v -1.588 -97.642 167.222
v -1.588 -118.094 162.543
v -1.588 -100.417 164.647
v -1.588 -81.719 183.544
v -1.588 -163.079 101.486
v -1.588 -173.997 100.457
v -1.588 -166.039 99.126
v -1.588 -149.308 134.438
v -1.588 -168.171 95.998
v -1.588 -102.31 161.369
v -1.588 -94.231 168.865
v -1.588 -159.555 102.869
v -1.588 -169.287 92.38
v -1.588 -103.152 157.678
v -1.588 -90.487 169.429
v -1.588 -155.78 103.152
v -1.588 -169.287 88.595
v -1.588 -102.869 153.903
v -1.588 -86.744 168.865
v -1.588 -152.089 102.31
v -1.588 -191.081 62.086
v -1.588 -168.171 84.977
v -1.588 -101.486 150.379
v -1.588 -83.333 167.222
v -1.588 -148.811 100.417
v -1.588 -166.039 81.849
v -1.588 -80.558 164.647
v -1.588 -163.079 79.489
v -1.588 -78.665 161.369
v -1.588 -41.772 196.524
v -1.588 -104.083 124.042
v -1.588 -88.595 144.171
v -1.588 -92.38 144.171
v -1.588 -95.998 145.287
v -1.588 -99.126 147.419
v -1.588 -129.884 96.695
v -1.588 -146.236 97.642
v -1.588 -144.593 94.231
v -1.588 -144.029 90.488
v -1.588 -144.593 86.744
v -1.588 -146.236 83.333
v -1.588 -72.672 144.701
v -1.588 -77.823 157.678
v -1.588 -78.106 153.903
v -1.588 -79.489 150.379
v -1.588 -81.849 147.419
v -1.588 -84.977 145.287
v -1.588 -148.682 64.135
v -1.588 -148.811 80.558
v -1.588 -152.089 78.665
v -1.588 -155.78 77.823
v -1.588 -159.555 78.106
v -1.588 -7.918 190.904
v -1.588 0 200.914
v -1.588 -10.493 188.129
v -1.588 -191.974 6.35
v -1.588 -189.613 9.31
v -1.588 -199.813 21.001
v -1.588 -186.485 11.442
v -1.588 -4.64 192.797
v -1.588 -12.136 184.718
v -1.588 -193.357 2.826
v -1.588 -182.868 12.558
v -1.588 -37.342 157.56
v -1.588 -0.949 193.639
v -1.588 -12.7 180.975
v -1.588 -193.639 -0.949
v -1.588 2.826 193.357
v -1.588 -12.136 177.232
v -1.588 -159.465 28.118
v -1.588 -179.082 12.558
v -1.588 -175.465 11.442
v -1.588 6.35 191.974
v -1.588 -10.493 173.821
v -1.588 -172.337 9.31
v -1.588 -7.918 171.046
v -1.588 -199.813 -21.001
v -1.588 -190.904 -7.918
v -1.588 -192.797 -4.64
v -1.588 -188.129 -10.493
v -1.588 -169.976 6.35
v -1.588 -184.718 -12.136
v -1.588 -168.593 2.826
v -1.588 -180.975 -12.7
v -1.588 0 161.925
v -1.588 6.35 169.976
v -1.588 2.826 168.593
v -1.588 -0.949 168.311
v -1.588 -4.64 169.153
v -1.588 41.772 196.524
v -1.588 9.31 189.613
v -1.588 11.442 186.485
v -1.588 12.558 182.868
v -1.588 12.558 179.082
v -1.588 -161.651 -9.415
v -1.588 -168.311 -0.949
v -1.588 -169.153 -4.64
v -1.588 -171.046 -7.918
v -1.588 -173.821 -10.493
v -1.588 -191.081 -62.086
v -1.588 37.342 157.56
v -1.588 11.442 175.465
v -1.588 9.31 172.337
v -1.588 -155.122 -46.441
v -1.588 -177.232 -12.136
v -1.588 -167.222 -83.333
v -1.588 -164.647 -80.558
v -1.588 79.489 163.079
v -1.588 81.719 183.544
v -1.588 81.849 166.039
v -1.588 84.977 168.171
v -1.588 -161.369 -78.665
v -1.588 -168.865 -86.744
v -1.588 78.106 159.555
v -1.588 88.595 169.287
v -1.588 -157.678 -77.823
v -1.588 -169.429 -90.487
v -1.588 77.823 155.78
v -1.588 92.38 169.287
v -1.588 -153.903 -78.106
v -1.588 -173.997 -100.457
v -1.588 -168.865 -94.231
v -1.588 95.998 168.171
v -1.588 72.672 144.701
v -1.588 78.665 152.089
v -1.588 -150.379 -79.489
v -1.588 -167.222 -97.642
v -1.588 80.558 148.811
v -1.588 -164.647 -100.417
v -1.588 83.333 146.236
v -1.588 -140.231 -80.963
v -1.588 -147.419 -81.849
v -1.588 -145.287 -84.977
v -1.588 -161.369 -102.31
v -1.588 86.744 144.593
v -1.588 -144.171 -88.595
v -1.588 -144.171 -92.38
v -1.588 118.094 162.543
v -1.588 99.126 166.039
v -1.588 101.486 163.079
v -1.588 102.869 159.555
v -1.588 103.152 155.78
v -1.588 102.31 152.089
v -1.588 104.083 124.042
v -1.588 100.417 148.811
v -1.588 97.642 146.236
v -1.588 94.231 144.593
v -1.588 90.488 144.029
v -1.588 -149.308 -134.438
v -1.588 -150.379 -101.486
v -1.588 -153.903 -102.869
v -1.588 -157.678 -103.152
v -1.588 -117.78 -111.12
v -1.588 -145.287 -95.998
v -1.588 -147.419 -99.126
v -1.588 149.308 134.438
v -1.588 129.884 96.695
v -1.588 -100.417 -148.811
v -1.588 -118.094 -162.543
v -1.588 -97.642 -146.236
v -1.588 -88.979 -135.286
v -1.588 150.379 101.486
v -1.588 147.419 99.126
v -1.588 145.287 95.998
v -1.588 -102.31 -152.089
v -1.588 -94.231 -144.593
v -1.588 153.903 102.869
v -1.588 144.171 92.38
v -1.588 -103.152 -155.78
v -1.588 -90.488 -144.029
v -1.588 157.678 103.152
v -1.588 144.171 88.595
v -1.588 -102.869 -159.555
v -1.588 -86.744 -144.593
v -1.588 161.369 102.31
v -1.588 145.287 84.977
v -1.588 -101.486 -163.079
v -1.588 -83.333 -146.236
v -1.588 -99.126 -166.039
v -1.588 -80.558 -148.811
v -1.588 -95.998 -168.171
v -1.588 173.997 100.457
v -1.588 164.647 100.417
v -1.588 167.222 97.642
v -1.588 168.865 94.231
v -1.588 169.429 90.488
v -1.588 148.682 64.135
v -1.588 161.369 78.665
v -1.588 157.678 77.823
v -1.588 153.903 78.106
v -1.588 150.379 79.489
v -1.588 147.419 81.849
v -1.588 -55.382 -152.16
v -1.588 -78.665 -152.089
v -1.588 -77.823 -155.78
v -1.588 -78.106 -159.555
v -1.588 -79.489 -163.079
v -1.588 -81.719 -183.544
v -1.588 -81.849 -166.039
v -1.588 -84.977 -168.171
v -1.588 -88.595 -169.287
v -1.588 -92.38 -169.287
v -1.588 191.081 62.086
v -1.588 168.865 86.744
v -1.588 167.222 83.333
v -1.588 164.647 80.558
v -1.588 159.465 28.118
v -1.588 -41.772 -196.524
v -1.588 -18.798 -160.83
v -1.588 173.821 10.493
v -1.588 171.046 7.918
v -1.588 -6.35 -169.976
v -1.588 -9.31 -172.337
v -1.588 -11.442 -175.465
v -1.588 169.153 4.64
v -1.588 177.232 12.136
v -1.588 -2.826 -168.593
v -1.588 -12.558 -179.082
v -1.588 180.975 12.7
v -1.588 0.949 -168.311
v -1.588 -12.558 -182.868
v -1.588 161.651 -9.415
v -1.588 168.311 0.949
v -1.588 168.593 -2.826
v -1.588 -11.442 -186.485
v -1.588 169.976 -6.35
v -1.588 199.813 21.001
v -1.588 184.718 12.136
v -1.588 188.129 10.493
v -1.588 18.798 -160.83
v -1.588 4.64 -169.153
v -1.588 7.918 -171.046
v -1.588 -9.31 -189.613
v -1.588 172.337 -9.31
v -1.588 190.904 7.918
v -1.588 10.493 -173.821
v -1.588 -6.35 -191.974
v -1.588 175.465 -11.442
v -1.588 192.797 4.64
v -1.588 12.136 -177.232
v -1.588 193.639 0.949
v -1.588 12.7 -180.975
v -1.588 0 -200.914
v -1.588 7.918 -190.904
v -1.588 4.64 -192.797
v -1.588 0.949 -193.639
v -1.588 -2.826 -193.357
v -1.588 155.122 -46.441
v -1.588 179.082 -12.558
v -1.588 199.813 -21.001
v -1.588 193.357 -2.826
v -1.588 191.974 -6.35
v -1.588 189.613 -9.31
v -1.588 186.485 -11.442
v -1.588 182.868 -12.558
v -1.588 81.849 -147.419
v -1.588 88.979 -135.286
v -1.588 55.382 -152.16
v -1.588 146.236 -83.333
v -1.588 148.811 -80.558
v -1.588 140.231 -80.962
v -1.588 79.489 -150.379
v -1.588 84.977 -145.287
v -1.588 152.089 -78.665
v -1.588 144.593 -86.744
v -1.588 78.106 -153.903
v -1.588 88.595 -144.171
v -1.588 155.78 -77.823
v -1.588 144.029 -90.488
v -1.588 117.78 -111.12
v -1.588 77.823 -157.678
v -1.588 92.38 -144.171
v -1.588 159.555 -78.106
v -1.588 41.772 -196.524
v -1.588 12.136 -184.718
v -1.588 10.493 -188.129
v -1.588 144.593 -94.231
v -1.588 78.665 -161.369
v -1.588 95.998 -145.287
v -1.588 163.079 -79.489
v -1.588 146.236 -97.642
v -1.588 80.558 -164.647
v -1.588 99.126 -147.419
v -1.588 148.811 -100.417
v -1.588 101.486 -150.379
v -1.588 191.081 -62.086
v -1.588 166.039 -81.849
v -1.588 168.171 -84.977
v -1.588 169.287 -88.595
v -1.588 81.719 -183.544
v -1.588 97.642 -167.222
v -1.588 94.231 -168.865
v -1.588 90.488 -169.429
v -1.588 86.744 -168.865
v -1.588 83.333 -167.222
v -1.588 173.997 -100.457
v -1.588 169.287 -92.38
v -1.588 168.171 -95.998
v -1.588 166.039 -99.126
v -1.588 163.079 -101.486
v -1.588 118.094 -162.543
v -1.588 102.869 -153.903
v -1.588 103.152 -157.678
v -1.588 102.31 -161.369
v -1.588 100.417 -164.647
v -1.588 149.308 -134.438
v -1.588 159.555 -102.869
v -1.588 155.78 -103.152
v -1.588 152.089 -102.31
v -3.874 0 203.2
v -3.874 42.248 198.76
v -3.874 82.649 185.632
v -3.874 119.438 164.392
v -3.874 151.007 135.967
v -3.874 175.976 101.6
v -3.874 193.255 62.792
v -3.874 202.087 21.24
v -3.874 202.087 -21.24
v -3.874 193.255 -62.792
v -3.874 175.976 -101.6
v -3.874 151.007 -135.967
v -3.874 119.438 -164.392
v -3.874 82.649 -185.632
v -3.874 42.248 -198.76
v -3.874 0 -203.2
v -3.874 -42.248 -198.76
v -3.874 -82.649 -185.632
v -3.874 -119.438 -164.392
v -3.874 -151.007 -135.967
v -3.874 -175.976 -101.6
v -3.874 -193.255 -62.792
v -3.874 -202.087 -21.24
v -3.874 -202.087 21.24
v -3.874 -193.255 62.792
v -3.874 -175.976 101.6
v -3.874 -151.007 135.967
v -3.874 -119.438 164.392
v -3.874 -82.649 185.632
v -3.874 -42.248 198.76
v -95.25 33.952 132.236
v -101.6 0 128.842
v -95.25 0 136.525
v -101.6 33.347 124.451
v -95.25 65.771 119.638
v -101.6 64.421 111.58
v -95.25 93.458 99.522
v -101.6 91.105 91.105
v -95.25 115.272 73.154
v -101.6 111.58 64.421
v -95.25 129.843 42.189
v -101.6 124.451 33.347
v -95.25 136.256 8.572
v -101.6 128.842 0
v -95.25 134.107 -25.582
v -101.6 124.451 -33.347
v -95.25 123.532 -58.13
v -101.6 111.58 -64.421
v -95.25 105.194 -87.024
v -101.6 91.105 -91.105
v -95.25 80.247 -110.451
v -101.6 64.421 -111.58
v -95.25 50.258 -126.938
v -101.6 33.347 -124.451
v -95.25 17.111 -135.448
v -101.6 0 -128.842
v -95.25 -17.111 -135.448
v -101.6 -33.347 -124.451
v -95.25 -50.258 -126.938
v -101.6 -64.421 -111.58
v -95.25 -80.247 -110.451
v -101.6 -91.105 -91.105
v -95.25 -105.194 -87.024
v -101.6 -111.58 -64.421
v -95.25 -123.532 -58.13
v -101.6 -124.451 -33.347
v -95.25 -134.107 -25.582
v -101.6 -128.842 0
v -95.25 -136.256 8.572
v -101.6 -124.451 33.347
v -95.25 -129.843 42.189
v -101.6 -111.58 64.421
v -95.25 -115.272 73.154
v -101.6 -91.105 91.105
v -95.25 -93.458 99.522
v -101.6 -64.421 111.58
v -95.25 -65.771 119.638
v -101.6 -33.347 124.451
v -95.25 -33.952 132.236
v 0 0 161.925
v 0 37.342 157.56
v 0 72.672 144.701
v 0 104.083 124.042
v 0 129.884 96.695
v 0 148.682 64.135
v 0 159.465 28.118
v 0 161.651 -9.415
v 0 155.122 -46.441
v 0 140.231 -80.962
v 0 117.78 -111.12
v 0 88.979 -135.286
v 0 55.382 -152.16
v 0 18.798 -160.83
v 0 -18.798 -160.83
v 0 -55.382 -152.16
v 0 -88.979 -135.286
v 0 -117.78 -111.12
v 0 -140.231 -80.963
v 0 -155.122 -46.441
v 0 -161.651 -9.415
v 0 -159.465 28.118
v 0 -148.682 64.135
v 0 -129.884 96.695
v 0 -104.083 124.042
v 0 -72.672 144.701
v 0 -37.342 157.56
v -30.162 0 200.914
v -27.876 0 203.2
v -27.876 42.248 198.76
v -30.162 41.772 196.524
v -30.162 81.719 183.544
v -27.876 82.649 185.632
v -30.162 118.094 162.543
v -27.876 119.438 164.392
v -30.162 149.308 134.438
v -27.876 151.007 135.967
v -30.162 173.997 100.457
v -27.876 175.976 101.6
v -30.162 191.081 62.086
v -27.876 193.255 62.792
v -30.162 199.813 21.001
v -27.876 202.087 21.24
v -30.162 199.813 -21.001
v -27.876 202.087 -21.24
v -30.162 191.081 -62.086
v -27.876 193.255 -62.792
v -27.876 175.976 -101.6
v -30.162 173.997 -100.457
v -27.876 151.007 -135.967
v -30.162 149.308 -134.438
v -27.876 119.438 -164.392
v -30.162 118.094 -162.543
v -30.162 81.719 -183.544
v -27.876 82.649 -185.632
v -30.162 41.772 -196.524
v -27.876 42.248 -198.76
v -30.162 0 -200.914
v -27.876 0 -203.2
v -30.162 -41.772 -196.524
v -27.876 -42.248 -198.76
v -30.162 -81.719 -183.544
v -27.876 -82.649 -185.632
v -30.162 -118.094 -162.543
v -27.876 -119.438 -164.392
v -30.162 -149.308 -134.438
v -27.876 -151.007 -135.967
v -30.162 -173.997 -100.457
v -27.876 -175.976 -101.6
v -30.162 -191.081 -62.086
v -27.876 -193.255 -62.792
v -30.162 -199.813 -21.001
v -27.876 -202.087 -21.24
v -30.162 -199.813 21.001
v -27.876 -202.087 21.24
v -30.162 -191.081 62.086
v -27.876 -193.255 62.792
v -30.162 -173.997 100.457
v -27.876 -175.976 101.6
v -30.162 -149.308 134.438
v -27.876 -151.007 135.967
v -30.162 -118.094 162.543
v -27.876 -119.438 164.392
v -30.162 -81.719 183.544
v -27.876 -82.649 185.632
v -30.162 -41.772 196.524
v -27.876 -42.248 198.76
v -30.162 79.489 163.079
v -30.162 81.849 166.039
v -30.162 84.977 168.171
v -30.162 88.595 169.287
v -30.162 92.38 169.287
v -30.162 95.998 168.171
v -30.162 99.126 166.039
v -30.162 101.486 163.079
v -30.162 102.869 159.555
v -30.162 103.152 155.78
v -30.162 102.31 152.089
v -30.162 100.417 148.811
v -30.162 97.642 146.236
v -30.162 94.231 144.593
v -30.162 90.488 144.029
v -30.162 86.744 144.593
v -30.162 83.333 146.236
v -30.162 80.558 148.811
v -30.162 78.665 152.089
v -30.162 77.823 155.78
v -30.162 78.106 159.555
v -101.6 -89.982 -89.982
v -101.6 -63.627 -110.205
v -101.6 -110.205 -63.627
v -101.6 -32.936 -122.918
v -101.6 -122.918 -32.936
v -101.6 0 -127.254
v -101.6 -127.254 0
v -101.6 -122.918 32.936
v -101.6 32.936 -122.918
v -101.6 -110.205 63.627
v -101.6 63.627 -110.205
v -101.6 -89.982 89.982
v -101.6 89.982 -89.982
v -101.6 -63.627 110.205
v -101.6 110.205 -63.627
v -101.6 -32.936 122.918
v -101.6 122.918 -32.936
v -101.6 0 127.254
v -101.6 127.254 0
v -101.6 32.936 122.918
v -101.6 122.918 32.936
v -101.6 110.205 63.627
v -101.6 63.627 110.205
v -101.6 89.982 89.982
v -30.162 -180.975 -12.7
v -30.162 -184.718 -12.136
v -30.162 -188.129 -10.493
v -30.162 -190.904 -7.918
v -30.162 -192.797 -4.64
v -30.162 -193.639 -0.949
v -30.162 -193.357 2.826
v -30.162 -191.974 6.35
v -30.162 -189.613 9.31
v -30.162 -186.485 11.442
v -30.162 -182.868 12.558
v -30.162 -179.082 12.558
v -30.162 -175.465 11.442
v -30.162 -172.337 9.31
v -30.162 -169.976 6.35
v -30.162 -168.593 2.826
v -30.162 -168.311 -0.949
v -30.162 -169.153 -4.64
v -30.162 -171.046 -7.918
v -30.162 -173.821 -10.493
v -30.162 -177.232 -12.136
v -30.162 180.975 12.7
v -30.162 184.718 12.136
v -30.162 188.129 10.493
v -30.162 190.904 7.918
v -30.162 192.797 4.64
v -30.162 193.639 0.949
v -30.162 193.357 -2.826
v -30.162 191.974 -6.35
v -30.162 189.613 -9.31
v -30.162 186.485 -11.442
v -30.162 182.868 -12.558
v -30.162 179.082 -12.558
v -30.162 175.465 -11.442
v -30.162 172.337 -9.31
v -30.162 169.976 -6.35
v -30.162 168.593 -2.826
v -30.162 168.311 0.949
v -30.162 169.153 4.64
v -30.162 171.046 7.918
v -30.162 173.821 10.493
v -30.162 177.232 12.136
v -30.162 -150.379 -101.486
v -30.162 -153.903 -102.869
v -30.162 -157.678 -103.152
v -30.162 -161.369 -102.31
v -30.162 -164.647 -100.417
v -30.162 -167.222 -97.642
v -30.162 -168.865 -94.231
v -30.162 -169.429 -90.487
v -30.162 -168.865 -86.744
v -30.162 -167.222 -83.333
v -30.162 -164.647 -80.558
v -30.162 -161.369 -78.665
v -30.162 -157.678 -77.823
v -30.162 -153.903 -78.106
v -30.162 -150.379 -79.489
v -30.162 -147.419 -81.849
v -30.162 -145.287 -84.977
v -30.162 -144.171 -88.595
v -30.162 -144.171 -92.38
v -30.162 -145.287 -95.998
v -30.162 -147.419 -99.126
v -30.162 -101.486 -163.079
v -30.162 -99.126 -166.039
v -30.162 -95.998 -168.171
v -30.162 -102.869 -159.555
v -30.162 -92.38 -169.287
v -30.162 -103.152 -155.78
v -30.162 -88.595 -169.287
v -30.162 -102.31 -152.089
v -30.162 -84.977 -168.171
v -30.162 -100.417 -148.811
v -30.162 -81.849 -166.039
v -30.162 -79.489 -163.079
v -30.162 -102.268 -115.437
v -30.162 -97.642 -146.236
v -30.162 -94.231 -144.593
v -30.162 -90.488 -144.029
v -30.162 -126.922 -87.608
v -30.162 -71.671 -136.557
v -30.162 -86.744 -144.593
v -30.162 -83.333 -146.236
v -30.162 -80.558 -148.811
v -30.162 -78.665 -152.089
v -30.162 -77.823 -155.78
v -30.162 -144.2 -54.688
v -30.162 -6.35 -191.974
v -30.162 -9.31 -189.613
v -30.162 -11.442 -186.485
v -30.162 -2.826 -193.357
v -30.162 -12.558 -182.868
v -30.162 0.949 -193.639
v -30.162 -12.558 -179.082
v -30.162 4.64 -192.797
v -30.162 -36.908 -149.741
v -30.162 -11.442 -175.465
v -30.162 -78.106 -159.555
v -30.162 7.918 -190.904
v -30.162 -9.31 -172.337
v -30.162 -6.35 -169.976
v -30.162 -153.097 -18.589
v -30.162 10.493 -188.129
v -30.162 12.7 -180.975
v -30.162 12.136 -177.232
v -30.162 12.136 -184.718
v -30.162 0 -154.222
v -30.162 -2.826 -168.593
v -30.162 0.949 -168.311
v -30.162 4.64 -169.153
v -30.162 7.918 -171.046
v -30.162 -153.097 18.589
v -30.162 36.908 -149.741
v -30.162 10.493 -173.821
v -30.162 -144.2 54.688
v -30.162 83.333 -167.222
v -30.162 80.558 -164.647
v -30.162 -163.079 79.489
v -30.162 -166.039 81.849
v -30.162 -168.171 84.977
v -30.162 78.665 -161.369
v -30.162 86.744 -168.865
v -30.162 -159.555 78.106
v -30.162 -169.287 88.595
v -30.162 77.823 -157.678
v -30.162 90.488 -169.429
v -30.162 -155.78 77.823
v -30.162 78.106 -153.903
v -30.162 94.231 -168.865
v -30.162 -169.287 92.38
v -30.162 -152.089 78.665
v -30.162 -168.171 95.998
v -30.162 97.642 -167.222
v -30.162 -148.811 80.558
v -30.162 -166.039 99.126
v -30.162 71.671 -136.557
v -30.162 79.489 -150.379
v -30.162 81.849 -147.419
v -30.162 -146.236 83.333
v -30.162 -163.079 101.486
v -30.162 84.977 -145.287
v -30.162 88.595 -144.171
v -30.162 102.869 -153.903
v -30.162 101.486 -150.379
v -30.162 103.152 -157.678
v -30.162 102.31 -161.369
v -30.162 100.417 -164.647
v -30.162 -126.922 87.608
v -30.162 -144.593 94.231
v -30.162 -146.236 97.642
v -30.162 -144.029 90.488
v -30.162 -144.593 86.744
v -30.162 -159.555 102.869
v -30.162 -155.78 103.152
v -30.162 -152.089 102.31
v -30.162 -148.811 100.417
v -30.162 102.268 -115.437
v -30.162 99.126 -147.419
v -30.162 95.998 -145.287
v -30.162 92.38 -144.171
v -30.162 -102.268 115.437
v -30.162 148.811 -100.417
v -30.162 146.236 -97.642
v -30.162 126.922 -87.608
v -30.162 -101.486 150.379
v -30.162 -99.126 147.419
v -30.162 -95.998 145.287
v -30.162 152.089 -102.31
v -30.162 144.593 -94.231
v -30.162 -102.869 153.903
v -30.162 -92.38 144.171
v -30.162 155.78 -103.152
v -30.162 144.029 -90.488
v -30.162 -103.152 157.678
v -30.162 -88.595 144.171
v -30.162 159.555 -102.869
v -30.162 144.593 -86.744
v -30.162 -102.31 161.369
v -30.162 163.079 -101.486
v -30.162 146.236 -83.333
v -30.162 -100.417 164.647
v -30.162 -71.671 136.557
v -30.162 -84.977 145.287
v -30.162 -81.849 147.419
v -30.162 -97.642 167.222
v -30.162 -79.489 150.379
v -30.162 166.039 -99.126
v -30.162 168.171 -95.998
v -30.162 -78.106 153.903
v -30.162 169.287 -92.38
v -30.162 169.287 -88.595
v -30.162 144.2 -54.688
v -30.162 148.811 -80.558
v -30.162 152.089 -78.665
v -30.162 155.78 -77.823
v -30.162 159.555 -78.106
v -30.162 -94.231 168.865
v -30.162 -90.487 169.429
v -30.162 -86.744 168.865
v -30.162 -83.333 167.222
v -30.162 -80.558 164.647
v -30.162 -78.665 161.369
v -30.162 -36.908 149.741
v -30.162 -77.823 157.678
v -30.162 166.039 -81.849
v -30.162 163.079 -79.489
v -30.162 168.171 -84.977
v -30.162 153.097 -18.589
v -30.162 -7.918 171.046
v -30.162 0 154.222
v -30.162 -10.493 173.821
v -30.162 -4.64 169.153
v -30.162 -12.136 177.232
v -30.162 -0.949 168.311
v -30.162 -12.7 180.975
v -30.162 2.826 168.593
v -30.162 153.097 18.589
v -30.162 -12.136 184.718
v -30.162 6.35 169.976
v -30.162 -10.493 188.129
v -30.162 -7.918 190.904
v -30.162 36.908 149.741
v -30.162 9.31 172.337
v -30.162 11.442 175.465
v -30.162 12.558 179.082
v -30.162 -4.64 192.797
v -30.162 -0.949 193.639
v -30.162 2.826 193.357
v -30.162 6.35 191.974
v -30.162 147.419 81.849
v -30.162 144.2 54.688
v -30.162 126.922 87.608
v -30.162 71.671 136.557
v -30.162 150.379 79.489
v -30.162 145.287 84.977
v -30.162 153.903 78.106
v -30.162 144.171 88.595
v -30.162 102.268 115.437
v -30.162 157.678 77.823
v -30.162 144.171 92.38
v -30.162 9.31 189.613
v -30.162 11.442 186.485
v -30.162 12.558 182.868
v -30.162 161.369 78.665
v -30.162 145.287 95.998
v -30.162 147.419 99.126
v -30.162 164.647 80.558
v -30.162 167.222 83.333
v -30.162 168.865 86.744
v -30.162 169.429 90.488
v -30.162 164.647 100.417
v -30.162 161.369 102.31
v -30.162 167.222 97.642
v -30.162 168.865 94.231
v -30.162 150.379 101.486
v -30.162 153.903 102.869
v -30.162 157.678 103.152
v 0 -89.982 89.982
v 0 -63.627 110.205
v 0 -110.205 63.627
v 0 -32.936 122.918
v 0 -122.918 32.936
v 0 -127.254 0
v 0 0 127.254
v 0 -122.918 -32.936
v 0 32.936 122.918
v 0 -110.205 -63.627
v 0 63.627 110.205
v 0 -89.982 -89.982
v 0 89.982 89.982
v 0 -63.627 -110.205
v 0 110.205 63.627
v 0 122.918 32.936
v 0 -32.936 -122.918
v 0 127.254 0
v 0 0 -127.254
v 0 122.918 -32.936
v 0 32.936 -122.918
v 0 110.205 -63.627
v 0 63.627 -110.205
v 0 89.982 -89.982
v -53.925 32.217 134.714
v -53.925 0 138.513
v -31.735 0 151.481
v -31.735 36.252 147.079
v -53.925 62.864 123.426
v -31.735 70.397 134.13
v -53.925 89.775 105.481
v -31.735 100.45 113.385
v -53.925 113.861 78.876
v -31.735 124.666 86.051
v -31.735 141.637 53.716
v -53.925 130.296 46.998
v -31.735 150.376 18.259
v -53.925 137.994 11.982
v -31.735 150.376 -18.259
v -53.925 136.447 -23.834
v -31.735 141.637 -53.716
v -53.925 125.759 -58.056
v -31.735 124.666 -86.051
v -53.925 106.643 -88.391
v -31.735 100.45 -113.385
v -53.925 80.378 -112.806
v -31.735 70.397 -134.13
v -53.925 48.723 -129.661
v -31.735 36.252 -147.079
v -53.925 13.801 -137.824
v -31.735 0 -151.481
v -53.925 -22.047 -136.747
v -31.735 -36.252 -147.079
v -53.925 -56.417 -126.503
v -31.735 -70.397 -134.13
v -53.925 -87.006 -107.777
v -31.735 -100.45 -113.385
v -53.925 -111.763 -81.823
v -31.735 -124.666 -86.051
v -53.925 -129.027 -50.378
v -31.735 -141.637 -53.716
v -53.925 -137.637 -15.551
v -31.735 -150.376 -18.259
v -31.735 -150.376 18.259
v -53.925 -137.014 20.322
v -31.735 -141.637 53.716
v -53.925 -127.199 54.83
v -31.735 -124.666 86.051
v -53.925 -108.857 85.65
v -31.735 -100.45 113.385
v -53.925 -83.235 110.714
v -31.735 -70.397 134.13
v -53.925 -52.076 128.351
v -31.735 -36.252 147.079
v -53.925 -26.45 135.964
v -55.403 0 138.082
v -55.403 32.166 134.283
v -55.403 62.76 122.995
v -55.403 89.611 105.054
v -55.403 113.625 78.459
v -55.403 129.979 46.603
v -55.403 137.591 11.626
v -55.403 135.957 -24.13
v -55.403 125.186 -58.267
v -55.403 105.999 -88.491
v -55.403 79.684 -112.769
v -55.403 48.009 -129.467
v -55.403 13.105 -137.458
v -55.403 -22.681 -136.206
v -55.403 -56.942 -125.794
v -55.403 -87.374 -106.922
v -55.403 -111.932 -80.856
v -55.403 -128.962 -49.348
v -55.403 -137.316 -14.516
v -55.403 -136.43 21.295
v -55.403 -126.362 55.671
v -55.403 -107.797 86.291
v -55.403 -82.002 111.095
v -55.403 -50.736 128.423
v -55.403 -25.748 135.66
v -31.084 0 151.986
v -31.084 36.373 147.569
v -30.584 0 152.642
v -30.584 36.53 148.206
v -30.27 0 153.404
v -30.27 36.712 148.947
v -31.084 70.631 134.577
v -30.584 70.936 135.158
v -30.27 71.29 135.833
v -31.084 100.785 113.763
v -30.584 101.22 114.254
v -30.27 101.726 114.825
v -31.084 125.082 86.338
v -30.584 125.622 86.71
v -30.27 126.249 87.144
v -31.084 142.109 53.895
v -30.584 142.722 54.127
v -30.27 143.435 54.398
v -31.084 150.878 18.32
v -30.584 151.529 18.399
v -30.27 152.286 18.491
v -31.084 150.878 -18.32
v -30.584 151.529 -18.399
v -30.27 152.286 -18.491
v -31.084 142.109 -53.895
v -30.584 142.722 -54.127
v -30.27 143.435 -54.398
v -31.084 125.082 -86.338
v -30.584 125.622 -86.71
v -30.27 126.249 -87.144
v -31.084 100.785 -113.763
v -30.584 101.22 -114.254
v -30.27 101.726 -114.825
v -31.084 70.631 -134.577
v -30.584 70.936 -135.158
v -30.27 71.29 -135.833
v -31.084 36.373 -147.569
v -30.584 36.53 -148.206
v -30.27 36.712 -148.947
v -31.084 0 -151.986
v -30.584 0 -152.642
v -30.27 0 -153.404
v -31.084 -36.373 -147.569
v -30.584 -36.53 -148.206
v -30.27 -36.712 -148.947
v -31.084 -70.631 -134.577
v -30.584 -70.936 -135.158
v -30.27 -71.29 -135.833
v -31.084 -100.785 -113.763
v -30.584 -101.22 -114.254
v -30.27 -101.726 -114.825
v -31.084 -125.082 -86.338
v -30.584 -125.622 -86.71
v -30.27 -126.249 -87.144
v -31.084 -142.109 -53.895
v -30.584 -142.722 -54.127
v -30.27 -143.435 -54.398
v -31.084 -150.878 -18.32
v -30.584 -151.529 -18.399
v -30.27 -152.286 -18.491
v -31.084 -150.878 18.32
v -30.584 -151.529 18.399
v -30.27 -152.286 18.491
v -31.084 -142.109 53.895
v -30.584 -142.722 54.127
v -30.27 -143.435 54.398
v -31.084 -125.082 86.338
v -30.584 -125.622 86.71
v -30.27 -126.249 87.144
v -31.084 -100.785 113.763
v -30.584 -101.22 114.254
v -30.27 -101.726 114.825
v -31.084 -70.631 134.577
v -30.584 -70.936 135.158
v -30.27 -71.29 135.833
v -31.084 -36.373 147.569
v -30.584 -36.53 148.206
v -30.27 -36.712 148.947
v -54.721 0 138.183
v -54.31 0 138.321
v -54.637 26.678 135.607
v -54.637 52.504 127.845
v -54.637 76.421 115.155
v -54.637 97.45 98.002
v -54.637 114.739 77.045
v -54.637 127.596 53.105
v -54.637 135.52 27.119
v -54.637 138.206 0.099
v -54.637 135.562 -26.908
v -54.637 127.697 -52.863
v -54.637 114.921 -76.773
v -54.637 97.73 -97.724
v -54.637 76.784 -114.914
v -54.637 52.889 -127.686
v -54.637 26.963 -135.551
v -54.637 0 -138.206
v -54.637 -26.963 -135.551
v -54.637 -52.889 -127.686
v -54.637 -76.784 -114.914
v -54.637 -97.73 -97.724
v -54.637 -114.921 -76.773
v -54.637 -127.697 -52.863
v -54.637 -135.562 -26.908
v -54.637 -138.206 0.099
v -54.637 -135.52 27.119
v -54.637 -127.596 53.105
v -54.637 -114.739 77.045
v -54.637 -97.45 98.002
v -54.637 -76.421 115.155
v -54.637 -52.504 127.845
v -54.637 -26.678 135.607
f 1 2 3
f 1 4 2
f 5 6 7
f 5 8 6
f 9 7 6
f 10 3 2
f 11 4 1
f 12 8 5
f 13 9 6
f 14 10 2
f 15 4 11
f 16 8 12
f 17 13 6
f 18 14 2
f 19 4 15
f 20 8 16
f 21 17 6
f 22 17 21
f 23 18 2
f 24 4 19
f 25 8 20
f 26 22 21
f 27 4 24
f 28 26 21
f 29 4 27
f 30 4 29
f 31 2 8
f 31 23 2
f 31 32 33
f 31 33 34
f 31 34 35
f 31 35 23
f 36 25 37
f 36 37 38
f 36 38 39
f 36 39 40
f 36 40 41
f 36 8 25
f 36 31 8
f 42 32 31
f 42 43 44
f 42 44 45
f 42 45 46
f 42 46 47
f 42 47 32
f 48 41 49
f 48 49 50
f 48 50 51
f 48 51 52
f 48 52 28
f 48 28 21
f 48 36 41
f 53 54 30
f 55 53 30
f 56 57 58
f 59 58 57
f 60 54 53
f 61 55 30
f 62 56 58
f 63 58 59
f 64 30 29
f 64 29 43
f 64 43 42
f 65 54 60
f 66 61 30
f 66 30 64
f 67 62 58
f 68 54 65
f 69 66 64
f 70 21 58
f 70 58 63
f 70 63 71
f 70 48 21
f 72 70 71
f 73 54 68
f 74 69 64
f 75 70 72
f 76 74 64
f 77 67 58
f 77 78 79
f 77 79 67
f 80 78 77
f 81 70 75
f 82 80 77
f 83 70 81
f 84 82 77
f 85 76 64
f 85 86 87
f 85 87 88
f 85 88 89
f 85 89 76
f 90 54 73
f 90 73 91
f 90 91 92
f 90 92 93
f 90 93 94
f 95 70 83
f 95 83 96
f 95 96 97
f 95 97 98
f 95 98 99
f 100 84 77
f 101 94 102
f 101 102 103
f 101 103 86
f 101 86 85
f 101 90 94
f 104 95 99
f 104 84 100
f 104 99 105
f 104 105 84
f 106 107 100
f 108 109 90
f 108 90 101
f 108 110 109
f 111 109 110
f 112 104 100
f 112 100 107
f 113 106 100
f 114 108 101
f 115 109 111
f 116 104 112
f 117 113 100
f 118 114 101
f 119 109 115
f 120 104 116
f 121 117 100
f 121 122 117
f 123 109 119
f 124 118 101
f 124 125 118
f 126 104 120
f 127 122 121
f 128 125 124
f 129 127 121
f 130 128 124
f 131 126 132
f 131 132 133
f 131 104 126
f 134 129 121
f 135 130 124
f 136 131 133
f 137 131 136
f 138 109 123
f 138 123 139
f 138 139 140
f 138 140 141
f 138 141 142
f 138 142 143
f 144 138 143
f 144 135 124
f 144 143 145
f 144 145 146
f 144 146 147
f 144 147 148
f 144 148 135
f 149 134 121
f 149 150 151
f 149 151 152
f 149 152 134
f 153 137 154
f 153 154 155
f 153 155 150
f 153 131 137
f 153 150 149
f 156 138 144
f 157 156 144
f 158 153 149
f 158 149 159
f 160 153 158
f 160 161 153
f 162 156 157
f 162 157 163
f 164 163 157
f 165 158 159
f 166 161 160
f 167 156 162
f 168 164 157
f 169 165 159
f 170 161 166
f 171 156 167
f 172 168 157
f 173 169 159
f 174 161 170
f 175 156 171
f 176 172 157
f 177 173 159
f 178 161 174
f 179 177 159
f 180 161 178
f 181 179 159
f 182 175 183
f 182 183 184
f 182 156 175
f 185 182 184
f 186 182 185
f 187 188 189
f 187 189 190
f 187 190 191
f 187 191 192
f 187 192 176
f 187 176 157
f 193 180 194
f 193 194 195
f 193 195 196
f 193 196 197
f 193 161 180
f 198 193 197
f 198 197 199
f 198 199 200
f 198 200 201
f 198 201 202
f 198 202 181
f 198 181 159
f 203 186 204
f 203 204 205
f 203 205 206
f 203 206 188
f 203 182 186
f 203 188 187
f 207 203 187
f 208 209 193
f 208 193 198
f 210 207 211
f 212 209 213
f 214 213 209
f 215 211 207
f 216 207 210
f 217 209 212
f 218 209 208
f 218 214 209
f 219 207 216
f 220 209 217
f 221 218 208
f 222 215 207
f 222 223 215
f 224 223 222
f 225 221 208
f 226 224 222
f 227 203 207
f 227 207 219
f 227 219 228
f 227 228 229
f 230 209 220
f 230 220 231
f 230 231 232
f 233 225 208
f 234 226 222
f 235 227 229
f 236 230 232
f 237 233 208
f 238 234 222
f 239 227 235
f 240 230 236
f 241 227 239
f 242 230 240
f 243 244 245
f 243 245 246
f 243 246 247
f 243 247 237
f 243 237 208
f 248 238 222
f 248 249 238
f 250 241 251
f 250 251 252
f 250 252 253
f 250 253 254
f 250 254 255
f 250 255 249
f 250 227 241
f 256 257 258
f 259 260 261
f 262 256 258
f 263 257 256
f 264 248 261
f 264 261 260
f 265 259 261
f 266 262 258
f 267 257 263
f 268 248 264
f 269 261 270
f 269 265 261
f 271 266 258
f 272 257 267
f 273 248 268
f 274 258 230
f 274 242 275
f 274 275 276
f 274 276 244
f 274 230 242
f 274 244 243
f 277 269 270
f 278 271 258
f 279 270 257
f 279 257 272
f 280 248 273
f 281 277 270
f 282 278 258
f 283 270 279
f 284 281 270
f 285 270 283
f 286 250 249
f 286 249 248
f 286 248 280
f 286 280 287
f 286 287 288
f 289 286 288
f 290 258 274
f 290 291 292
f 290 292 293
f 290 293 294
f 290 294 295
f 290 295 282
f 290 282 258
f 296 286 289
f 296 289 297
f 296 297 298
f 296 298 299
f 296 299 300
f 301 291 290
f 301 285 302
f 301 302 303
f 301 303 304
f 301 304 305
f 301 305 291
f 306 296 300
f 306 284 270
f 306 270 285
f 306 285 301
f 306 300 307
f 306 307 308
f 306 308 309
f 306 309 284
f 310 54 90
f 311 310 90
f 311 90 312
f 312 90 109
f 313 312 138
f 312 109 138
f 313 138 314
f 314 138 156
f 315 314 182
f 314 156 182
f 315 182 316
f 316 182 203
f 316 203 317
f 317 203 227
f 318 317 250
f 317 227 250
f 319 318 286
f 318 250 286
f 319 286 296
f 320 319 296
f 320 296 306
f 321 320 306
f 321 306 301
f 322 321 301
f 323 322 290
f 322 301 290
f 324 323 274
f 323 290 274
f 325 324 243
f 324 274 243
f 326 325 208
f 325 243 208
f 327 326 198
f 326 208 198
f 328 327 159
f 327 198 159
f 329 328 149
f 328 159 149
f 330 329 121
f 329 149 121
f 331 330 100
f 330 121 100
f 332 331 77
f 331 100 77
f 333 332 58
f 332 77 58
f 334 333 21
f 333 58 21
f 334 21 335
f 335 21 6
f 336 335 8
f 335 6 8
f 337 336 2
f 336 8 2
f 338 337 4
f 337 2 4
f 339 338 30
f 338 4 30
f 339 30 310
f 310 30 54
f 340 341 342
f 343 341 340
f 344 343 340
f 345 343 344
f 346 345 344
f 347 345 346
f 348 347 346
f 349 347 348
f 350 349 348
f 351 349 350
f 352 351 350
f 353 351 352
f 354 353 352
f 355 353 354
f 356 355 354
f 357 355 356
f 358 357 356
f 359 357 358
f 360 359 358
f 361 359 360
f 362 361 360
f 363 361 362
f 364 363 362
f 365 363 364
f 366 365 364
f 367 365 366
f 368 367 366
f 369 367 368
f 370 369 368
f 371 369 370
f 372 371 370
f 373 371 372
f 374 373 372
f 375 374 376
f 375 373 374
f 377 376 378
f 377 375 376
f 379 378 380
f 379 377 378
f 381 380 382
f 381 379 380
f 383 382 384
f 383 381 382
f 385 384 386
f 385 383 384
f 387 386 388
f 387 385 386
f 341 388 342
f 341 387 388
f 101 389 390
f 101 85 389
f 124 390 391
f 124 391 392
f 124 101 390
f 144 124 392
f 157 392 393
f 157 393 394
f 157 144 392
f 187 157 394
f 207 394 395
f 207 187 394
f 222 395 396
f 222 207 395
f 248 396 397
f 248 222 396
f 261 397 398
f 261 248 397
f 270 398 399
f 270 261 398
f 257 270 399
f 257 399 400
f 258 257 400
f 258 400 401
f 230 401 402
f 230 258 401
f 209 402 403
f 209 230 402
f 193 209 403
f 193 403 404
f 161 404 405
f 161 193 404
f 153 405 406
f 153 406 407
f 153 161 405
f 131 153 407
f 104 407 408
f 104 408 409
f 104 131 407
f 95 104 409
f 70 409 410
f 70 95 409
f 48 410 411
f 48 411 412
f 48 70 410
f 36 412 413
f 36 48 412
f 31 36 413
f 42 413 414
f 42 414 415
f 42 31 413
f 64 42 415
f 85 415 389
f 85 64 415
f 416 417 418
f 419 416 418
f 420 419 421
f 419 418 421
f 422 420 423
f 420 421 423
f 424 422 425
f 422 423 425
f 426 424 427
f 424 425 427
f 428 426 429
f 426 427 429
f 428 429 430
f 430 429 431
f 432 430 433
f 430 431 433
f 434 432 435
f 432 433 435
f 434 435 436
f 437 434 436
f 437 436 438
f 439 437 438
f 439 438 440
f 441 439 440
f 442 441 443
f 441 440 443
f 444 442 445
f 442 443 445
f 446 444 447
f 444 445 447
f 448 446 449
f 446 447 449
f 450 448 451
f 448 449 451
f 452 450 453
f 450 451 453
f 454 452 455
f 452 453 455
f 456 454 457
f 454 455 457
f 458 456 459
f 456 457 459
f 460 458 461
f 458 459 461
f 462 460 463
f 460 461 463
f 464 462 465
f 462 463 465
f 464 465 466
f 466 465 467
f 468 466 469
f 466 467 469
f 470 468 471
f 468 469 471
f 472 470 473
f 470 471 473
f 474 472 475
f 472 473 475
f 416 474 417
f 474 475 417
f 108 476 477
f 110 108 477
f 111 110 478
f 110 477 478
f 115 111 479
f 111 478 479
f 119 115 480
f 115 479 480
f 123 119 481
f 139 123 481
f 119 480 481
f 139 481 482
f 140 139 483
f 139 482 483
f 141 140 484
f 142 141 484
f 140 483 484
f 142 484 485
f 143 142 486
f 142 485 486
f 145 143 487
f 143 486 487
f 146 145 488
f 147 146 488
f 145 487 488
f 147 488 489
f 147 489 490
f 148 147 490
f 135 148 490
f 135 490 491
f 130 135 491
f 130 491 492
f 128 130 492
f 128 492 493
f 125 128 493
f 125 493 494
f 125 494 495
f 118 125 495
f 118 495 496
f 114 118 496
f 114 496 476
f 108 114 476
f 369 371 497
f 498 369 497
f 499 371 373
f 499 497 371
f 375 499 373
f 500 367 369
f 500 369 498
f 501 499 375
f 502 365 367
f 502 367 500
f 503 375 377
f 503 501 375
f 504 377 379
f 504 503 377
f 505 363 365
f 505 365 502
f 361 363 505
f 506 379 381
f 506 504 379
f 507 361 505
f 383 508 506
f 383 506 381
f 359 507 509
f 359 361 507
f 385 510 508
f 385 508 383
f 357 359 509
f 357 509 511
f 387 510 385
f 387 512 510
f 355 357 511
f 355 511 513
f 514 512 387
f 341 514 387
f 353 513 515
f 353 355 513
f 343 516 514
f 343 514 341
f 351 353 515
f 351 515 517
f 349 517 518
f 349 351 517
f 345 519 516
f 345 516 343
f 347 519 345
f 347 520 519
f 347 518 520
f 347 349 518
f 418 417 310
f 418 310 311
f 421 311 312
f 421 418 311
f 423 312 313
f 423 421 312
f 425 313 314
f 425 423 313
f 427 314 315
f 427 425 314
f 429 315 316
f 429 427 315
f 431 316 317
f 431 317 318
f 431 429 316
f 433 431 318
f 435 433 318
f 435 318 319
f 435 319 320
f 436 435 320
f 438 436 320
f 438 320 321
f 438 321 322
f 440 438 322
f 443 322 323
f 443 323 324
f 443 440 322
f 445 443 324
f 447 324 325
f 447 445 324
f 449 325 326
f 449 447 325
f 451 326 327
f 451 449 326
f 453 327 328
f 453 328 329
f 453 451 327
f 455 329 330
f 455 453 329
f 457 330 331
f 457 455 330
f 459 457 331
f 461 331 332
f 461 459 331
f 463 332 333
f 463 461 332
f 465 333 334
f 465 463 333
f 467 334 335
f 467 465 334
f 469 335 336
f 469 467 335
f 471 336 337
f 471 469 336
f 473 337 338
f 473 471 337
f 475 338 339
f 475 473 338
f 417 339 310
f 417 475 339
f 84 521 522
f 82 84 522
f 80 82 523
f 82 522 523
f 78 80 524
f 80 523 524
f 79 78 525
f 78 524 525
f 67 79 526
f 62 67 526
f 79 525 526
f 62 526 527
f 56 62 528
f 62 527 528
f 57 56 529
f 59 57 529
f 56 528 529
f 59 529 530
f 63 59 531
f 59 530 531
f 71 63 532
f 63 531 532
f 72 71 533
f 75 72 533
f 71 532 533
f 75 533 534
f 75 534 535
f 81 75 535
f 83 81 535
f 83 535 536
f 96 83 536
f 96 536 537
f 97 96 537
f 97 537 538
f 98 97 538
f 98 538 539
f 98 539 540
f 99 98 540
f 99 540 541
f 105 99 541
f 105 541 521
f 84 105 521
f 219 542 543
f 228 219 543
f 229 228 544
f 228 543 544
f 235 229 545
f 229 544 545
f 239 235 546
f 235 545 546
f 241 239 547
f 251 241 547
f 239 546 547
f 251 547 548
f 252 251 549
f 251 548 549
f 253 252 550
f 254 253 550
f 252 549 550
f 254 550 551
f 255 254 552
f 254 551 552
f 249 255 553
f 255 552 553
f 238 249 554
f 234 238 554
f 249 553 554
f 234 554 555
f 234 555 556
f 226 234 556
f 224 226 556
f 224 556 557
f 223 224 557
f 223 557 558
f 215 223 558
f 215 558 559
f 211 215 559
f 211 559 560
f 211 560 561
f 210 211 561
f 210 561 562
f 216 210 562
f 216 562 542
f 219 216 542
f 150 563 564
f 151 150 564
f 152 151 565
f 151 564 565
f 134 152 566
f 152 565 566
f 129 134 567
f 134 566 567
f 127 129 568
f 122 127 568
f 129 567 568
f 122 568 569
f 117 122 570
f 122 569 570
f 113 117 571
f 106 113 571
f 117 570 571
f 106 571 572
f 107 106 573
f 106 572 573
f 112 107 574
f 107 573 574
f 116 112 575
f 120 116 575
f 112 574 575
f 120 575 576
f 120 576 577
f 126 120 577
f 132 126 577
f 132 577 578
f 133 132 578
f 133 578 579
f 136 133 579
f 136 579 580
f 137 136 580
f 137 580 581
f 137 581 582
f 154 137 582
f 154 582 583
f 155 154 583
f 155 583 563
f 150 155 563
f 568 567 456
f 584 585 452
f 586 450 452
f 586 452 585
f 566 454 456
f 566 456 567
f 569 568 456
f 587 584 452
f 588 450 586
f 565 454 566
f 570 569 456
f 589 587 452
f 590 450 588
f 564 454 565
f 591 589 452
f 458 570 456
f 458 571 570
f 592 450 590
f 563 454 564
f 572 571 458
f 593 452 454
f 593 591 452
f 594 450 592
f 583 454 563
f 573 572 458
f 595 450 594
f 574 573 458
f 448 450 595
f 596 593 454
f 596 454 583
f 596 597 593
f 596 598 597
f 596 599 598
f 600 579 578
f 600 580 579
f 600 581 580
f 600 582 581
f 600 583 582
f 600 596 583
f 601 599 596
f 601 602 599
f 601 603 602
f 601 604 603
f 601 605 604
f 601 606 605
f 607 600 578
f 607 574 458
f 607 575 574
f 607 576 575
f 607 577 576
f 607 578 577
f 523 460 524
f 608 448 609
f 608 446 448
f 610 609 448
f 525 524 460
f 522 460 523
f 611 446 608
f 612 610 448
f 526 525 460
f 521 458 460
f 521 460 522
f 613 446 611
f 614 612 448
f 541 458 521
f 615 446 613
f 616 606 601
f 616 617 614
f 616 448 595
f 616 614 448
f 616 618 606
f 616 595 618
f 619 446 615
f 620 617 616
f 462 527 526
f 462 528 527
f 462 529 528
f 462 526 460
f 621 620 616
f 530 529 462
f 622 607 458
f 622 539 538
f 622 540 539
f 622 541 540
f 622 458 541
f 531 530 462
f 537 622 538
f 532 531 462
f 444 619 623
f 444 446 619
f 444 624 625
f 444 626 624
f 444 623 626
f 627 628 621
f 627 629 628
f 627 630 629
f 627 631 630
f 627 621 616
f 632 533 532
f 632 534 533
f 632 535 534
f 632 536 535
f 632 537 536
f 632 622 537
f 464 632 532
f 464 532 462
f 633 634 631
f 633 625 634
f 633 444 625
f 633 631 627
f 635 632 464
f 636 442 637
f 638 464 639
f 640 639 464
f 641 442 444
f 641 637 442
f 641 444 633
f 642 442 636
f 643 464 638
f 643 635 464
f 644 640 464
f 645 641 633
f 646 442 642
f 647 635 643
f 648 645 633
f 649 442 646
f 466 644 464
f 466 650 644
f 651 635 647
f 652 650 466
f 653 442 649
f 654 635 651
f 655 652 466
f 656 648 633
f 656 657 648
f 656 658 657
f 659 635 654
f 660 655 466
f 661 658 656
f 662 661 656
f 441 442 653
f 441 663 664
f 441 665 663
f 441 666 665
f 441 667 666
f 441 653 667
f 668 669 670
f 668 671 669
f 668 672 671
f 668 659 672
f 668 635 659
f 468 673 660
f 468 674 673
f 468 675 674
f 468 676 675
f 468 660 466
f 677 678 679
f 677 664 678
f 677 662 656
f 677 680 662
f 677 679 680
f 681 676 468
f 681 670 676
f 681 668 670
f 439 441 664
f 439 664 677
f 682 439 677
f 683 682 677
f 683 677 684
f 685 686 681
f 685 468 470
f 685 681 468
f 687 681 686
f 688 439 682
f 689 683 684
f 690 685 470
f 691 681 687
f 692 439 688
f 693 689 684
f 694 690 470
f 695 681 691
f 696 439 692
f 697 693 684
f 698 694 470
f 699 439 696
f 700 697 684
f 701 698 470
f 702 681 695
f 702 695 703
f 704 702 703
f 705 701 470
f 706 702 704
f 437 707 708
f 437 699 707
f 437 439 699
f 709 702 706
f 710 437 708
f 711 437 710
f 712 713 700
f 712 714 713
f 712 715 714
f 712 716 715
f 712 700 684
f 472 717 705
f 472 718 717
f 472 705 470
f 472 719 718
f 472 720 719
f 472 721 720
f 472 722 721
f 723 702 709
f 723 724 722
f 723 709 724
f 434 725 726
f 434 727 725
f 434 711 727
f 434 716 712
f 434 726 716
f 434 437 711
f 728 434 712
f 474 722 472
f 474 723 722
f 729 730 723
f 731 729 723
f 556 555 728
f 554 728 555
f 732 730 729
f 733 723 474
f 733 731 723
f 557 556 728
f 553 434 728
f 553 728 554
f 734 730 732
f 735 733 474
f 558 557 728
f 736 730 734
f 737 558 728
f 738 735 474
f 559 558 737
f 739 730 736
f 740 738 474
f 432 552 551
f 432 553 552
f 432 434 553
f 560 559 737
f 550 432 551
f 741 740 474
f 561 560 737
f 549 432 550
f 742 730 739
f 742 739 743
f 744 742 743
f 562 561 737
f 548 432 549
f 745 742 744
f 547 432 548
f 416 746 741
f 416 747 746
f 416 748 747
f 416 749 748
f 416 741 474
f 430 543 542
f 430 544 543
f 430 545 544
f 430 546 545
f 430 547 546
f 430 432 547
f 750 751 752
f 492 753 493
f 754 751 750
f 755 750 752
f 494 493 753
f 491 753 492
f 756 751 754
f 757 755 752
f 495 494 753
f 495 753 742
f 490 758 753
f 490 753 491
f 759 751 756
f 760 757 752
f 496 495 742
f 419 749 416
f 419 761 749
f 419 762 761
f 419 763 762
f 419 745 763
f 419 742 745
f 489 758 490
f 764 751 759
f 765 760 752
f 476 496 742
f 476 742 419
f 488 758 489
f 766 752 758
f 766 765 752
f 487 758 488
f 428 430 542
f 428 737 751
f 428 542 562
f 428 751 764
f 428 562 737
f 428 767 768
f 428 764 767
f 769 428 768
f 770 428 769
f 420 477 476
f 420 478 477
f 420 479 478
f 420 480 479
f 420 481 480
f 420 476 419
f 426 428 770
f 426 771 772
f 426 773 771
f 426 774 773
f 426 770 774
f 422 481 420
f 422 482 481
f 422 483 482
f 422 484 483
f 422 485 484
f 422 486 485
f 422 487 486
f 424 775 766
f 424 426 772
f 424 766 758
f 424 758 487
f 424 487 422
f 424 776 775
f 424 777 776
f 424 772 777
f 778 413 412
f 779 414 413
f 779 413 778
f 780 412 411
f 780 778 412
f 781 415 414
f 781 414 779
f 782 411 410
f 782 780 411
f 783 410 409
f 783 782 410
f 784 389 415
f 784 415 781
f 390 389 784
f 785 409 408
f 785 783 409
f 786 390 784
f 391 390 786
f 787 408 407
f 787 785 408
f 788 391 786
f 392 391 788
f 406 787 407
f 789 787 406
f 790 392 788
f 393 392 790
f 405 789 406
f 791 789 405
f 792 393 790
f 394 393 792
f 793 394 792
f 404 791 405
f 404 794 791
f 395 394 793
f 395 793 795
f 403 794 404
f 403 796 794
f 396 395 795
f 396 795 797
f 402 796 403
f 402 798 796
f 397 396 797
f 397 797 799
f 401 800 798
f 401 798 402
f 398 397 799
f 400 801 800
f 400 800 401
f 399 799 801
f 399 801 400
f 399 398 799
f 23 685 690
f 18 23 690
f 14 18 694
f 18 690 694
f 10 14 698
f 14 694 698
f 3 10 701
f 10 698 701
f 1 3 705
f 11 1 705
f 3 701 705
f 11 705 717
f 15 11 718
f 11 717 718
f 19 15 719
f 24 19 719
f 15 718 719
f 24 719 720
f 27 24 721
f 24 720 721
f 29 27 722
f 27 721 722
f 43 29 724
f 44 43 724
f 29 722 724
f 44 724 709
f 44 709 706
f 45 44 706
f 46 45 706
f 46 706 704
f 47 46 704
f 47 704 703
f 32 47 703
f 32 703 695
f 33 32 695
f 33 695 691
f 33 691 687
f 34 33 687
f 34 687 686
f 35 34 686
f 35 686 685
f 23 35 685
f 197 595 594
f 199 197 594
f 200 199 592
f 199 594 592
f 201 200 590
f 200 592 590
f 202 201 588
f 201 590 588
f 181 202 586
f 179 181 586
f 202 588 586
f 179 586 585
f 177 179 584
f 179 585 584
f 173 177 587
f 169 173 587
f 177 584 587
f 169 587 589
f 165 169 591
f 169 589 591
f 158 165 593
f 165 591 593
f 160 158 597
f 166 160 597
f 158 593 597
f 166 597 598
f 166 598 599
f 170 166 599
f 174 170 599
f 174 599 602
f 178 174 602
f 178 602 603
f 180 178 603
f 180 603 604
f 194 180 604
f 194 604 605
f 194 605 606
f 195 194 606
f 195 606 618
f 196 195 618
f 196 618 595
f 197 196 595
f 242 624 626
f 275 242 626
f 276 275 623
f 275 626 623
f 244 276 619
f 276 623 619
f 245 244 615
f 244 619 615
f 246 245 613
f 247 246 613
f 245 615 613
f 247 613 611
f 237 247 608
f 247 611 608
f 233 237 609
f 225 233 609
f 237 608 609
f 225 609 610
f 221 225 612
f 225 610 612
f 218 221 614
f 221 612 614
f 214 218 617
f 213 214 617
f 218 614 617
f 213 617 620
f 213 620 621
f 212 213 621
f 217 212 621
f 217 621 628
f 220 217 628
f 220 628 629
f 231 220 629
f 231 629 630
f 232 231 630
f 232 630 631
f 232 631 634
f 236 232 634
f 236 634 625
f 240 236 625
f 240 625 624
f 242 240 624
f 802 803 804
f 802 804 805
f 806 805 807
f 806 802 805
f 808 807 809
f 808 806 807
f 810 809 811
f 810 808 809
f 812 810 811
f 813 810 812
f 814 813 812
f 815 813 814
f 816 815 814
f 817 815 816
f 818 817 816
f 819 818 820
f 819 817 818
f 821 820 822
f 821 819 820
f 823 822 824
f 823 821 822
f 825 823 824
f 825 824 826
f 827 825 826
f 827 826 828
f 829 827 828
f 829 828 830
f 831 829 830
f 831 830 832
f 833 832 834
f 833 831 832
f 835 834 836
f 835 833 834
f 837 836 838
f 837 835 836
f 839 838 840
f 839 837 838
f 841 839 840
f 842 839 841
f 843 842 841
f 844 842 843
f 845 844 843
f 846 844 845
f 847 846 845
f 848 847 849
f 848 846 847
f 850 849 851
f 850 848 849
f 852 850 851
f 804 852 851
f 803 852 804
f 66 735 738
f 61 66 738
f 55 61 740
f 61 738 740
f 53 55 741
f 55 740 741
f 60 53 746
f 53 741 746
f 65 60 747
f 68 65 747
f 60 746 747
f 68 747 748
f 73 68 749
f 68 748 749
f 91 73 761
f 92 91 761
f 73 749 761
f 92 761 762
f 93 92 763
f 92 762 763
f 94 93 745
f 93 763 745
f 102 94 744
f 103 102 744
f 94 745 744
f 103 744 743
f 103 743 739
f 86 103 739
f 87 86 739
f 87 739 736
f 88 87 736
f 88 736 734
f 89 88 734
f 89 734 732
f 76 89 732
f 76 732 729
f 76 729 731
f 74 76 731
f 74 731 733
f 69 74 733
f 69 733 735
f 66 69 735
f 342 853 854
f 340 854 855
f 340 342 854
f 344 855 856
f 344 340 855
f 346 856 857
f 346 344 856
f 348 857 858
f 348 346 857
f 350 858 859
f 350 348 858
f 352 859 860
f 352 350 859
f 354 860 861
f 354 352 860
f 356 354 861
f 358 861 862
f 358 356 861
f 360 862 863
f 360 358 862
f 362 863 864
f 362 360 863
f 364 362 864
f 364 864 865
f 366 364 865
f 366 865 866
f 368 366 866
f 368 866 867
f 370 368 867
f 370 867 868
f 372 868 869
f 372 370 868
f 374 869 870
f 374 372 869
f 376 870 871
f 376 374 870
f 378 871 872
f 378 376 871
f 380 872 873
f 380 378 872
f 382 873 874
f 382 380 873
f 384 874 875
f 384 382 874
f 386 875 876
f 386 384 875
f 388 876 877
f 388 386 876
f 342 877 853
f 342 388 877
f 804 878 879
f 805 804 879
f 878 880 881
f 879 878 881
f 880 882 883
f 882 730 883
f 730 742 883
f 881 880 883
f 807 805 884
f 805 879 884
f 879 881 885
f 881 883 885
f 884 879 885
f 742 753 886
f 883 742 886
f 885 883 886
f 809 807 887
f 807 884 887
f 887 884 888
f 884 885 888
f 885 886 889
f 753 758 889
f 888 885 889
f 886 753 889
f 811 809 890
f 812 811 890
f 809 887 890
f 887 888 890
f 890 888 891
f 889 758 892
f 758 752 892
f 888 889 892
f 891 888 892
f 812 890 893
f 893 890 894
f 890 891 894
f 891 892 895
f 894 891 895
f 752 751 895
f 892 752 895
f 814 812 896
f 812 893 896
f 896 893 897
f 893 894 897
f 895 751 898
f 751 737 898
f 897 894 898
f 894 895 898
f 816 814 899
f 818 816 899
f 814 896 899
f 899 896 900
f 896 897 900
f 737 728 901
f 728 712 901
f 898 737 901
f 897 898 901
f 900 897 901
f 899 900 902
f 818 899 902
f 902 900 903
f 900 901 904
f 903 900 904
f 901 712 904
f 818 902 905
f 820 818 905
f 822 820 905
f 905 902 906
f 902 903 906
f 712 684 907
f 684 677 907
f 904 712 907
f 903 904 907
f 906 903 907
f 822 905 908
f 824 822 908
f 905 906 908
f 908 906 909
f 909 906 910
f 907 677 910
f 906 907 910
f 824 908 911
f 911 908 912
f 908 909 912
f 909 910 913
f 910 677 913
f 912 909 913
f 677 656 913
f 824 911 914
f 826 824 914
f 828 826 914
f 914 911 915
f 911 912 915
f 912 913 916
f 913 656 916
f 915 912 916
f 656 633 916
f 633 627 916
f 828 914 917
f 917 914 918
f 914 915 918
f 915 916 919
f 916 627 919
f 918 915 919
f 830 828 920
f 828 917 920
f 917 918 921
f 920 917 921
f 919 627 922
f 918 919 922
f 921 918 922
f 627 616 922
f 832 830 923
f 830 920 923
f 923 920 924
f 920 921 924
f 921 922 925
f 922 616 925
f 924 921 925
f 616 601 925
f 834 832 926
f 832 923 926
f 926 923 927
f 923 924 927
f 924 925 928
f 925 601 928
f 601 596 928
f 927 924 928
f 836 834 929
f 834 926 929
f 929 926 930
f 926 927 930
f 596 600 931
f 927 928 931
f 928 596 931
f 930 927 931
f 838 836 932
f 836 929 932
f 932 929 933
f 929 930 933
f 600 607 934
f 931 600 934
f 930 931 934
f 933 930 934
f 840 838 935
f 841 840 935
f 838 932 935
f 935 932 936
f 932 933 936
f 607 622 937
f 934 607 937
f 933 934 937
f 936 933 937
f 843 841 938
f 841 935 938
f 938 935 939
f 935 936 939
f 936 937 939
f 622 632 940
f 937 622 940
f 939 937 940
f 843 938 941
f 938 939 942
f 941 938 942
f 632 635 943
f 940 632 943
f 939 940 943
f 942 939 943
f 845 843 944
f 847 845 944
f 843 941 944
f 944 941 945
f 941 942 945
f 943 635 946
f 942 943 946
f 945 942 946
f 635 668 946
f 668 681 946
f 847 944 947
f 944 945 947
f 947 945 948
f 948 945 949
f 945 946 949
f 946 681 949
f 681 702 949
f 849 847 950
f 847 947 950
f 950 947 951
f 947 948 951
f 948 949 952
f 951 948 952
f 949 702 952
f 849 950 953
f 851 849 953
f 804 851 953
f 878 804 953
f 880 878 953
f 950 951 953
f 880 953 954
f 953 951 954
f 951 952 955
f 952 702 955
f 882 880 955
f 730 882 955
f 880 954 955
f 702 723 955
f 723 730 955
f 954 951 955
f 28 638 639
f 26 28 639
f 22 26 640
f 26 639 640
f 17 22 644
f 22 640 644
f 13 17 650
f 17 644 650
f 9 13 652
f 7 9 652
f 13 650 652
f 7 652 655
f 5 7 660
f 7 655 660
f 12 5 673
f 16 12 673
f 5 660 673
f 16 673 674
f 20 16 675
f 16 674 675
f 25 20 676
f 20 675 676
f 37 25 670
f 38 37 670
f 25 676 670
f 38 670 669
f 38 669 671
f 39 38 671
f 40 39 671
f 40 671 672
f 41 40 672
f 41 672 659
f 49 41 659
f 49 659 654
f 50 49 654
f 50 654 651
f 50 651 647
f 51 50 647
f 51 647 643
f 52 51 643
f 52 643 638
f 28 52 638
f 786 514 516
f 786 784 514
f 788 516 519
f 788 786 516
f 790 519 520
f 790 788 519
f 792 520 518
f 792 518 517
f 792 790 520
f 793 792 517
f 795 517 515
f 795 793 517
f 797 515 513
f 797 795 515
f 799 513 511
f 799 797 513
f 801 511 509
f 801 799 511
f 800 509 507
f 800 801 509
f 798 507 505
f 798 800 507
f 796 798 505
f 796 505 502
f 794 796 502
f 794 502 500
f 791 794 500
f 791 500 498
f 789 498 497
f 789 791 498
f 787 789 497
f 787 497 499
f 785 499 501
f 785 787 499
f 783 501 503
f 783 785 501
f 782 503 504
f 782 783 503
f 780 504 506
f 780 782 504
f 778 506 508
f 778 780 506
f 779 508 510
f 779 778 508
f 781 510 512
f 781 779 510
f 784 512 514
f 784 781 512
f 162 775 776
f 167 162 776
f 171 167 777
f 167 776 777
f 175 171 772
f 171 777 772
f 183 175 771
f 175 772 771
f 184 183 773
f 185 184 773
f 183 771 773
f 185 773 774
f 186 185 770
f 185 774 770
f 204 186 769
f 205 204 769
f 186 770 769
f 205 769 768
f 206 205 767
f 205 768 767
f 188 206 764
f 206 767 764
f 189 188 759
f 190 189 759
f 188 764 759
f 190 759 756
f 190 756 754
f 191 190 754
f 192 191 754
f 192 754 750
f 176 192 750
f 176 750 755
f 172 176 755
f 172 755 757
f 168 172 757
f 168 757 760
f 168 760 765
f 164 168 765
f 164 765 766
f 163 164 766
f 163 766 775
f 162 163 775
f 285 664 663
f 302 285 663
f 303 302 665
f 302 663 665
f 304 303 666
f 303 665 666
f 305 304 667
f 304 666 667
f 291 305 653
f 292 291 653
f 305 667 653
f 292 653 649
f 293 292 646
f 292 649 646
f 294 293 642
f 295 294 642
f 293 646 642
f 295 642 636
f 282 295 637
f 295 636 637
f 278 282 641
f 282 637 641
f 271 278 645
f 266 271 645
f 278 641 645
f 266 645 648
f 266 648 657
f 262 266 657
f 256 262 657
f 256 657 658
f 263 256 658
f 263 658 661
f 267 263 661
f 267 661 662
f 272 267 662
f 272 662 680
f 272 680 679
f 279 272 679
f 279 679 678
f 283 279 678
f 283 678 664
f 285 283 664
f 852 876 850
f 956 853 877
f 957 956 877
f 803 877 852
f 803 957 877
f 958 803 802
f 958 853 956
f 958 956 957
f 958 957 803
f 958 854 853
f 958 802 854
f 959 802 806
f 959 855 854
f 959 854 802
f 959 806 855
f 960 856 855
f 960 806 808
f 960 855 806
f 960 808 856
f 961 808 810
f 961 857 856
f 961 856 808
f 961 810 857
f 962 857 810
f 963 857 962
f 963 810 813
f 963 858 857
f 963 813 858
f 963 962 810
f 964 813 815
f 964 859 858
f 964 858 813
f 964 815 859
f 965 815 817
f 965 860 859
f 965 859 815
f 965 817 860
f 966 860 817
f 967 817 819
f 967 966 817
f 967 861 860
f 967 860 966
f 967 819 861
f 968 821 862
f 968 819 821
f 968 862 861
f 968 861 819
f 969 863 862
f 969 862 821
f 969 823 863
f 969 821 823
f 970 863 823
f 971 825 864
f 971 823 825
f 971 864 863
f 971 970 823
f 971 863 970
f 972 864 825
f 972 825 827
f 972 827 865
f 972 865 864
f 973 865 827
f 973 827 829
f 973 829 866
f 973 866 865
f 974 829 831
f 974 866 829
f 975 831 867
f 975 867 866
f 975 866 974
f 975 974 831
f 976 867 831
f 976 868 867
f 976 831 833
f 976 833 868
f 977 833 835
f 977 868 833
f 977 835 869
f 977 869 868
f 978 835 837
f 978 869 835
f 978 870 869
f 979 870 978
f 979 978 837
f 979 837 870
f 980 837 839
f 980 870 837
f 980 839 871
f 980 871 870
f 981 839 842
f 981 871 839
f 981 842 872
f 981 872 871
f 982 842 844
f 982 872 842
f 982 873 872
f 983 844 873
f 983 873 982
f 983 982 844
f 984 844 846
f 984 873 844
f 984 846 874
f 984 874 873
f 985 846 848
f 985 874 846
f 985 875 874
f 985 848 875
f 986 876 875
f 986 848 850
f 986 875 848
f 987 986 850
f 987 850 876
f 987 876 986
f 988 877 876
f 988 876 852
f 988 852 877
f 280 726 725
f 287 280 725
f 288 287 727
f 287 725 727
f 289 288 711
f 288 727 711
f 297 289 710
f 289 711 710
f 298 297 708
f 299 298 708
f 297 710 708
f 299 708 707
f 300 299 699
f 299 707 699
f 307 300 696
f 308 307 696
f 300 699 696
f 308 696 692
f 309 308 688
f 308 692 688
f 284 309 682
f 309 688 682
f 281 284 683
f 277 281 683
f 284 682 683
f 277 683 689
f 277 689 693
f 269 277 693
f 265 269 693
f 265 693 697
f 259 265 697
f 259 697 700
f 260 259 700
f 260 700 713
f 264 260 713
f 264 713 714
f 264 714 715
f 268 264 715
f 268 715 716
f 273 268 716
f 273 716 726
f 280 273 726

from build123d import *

# Parameters (mm, degrees)
F2_R            = 12.7
F3_DEPTH        = 30.1635
F3_COPIES_COUNT = 12
F4_R            = 3.175
F5_SIZE2        = 2.286
F5_SIZE         = 2.286


# Not quite as in the source:
# - a pattern or mirror of a feature is missing from the dataset's text; its kind, count and spacing are read off the source's solid


with BuildPart() as f1:
    # F0 (on Front) → F1 (revolve)
    with BuildSketch(Plane.XZ):
        Polygon((-101.6, 127.254), (0, 127.254), (0, 161.925), (-1.5875, 161.925), (-1.5875, 203.2), (-30.1625, 203.2), (-30.1625, 152.4), (-54.61, 138.1125), (-95.25, 136.525), (-101.6, 128.8415), align=None)
    revolve(axis=Axis((-71.3775697505, 0, 0), (-1, 0, 0)))

    # F2 (on face) → F3 (cut, through all)
    with BuildSketch(Plane(origin=(-30.1625, 0, 0), x_dir=(0, -1, 0), z_dir=(-1, 0, 0))):
        with Locations((0, 180.975)):
            Circle(F2_R)
    f3 = extrude(amount=-F3_DEPTH, mode=Mode.SUBTRACT)

    # F3_copies: F3 ×12 about axis
    f3_copies_axis = Axis((0, 0, 0), (1, 0, 0))
    for i in range(1, F3_COPIES_COUNT):
        add(f3.rotate(f3_copies_axis, i * 360 / F3_COPIES_COUNT), mode=Mode.SUBTRACT)

    # F4
    f4_edges = [f1.edges().sort_by_distance(p)[0] for p in [
        (-30.1625, 0, -152.4),
        (-54.61, 0, -138.1125),
    ]]
    fillet(f4_edges, radius=F4_R)

    # F5
    f5_edges = [f1.edges().sort_by_distance(p)[0] for p in [
        (-1.5875, 0, -203.2),
        (-30.1625, 0, -203.2),
        (-15.875, 0, 203.2),
    ]]
    chamfer(f5_edges, length=F5_SIZE, length2=F5_SIZE2)


solid = f1.part
